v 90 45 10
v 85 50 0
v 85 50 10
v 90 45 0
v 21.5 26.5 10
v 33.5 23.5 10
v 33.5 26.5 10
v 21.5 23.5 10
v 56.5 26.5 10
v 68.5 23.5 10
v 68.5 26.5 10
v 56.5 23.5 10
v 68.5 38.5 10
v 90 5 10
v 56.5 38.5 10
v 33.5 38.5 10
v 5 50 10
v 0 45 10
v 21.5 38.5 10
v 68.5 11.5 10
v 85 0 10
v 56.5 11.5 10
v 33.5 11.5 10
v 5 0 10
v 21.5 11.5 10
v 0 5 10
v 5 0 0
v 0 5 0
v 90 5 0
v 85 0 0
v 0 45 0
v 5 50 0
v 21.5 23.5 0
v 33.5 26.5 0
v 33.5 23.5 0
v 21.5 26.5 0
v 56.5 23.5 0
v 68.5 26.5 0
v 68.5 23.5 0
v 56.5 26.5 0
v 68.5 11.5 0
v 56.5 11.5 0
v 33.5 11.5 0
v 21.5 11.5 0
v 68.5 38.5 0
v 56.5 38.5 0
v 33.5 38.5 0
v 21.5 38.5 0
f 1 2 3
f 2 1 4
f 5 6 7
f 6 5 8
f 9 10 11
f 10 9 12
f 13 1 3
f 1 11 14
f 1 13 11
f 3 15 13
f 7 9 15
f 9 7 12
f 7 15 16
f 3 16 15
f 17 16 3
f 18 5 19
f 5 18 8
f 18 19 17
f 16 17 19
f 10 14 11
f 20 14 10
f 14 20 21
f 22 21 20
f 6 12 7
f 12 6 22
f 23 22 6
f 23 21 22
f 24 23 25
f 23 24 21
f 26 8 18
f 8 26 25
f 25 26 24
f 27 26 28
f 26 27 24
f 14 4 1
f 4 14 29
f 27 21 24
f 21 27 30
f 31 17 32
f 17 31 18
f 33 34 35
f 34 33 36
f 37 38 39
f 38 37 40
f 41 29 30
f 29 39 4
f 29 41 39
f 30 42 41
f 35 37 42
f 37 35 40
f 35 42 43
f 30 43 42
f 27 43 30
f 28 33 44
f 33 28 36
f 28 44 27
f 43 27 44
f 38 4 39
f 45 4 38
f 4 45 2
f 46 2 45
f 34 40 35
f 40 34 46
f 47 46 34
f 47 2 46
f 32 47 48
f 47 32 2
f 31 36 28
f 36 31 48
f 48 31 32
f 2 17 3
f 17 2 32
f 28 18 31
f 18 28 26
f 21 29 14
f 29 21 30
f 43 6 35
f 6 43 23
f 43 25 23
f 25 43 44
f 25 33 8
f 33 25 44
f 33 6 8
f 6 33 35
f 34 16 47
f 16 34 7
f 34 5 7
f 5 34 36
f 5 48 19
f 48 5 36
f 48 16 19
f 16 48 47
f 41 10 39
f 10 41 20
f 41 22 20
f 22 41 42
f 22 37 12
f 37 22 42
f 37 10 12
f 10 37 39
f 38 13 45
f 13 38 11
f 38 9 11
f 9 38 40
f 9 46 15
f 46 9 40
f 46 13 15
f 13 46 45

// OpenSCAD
$fn = 32;

// ----------------------------------------------------------------------
// Windowed plate: 4 voids, 90 x 50 x 10 mm
// ----------------------------------------------------------------------

// --- parameters (mm) ---
plate_l = 90;             // plate length, X
plate_w = 50;             // plate width, Y
plate_t = 10;             // plate thickness, Z
edge_margin = 10;         // wall from the plate edge to any window
win_l = 12;               // pocket length
win_w = 12;               // pocket width
pitch_x = 35;             // grid pitch along X
pitch_y = 15;             // grid pitch along Y
depth_1 = 10;             // depth of void 1 (full thickness = through)
depth_2 = 10;             // depth of void 2 (full thickness = through)
depth_3 = 10;             // depth of void 3 (full thickness = through)
depth_4 = 10;             // depth of void 4 (full thickness = through)
corner_c = 5;             // corner chamfer of the plate

profile = [[5, 0], [85, 0], [90, 5], [90, 45], [85, 50], [5, 50], [0, 45], [0, 5]];  // primary outline, 8 points, counter clockwise
void_1 = [[21.5, 11.5], [33.5, 11.5], [33.5, 23.5], [21.5, 23.5]];  // pocket at grid node 0,0, 4 points
void_2 = [[21.5, 26.5], [33.5, 26.5], [33.5, 38.5], [21.5, 38.5]];  // pocket at grid node 0,1, 4 points
void_3 = [[56.5, 11.5], [68.5, 11.5], [68.5, 23.5], [56.5, 23.5]];  // pocket at grid node 1,0, 4 points
void_4 = [[56.5, 26.5], [68.5, 26.5], [68.5, 38.5], [56.5, 38.5]];  // pocket at grid node 1,1, 4 points

// --- the one profile operation ---
difference() {
  linear_extrude(height = plate_t) polygon(points = profile);
  translate([0, 0, -1])
    linear_extrude(height = plate_t + 2) polygon(points = void_1);
  translate([0, 0, -1])
    linear_extrude(height = plate_t + 2) polygon(points = void_2);
  translate([0, 0, -1])
    linear_extrude(height = plate_t + 2) polygon(points = void_3);
  translate([0, 0, -1])
    linear_extrude(height = plate_t + 2) polygon(points = void_4);
}
